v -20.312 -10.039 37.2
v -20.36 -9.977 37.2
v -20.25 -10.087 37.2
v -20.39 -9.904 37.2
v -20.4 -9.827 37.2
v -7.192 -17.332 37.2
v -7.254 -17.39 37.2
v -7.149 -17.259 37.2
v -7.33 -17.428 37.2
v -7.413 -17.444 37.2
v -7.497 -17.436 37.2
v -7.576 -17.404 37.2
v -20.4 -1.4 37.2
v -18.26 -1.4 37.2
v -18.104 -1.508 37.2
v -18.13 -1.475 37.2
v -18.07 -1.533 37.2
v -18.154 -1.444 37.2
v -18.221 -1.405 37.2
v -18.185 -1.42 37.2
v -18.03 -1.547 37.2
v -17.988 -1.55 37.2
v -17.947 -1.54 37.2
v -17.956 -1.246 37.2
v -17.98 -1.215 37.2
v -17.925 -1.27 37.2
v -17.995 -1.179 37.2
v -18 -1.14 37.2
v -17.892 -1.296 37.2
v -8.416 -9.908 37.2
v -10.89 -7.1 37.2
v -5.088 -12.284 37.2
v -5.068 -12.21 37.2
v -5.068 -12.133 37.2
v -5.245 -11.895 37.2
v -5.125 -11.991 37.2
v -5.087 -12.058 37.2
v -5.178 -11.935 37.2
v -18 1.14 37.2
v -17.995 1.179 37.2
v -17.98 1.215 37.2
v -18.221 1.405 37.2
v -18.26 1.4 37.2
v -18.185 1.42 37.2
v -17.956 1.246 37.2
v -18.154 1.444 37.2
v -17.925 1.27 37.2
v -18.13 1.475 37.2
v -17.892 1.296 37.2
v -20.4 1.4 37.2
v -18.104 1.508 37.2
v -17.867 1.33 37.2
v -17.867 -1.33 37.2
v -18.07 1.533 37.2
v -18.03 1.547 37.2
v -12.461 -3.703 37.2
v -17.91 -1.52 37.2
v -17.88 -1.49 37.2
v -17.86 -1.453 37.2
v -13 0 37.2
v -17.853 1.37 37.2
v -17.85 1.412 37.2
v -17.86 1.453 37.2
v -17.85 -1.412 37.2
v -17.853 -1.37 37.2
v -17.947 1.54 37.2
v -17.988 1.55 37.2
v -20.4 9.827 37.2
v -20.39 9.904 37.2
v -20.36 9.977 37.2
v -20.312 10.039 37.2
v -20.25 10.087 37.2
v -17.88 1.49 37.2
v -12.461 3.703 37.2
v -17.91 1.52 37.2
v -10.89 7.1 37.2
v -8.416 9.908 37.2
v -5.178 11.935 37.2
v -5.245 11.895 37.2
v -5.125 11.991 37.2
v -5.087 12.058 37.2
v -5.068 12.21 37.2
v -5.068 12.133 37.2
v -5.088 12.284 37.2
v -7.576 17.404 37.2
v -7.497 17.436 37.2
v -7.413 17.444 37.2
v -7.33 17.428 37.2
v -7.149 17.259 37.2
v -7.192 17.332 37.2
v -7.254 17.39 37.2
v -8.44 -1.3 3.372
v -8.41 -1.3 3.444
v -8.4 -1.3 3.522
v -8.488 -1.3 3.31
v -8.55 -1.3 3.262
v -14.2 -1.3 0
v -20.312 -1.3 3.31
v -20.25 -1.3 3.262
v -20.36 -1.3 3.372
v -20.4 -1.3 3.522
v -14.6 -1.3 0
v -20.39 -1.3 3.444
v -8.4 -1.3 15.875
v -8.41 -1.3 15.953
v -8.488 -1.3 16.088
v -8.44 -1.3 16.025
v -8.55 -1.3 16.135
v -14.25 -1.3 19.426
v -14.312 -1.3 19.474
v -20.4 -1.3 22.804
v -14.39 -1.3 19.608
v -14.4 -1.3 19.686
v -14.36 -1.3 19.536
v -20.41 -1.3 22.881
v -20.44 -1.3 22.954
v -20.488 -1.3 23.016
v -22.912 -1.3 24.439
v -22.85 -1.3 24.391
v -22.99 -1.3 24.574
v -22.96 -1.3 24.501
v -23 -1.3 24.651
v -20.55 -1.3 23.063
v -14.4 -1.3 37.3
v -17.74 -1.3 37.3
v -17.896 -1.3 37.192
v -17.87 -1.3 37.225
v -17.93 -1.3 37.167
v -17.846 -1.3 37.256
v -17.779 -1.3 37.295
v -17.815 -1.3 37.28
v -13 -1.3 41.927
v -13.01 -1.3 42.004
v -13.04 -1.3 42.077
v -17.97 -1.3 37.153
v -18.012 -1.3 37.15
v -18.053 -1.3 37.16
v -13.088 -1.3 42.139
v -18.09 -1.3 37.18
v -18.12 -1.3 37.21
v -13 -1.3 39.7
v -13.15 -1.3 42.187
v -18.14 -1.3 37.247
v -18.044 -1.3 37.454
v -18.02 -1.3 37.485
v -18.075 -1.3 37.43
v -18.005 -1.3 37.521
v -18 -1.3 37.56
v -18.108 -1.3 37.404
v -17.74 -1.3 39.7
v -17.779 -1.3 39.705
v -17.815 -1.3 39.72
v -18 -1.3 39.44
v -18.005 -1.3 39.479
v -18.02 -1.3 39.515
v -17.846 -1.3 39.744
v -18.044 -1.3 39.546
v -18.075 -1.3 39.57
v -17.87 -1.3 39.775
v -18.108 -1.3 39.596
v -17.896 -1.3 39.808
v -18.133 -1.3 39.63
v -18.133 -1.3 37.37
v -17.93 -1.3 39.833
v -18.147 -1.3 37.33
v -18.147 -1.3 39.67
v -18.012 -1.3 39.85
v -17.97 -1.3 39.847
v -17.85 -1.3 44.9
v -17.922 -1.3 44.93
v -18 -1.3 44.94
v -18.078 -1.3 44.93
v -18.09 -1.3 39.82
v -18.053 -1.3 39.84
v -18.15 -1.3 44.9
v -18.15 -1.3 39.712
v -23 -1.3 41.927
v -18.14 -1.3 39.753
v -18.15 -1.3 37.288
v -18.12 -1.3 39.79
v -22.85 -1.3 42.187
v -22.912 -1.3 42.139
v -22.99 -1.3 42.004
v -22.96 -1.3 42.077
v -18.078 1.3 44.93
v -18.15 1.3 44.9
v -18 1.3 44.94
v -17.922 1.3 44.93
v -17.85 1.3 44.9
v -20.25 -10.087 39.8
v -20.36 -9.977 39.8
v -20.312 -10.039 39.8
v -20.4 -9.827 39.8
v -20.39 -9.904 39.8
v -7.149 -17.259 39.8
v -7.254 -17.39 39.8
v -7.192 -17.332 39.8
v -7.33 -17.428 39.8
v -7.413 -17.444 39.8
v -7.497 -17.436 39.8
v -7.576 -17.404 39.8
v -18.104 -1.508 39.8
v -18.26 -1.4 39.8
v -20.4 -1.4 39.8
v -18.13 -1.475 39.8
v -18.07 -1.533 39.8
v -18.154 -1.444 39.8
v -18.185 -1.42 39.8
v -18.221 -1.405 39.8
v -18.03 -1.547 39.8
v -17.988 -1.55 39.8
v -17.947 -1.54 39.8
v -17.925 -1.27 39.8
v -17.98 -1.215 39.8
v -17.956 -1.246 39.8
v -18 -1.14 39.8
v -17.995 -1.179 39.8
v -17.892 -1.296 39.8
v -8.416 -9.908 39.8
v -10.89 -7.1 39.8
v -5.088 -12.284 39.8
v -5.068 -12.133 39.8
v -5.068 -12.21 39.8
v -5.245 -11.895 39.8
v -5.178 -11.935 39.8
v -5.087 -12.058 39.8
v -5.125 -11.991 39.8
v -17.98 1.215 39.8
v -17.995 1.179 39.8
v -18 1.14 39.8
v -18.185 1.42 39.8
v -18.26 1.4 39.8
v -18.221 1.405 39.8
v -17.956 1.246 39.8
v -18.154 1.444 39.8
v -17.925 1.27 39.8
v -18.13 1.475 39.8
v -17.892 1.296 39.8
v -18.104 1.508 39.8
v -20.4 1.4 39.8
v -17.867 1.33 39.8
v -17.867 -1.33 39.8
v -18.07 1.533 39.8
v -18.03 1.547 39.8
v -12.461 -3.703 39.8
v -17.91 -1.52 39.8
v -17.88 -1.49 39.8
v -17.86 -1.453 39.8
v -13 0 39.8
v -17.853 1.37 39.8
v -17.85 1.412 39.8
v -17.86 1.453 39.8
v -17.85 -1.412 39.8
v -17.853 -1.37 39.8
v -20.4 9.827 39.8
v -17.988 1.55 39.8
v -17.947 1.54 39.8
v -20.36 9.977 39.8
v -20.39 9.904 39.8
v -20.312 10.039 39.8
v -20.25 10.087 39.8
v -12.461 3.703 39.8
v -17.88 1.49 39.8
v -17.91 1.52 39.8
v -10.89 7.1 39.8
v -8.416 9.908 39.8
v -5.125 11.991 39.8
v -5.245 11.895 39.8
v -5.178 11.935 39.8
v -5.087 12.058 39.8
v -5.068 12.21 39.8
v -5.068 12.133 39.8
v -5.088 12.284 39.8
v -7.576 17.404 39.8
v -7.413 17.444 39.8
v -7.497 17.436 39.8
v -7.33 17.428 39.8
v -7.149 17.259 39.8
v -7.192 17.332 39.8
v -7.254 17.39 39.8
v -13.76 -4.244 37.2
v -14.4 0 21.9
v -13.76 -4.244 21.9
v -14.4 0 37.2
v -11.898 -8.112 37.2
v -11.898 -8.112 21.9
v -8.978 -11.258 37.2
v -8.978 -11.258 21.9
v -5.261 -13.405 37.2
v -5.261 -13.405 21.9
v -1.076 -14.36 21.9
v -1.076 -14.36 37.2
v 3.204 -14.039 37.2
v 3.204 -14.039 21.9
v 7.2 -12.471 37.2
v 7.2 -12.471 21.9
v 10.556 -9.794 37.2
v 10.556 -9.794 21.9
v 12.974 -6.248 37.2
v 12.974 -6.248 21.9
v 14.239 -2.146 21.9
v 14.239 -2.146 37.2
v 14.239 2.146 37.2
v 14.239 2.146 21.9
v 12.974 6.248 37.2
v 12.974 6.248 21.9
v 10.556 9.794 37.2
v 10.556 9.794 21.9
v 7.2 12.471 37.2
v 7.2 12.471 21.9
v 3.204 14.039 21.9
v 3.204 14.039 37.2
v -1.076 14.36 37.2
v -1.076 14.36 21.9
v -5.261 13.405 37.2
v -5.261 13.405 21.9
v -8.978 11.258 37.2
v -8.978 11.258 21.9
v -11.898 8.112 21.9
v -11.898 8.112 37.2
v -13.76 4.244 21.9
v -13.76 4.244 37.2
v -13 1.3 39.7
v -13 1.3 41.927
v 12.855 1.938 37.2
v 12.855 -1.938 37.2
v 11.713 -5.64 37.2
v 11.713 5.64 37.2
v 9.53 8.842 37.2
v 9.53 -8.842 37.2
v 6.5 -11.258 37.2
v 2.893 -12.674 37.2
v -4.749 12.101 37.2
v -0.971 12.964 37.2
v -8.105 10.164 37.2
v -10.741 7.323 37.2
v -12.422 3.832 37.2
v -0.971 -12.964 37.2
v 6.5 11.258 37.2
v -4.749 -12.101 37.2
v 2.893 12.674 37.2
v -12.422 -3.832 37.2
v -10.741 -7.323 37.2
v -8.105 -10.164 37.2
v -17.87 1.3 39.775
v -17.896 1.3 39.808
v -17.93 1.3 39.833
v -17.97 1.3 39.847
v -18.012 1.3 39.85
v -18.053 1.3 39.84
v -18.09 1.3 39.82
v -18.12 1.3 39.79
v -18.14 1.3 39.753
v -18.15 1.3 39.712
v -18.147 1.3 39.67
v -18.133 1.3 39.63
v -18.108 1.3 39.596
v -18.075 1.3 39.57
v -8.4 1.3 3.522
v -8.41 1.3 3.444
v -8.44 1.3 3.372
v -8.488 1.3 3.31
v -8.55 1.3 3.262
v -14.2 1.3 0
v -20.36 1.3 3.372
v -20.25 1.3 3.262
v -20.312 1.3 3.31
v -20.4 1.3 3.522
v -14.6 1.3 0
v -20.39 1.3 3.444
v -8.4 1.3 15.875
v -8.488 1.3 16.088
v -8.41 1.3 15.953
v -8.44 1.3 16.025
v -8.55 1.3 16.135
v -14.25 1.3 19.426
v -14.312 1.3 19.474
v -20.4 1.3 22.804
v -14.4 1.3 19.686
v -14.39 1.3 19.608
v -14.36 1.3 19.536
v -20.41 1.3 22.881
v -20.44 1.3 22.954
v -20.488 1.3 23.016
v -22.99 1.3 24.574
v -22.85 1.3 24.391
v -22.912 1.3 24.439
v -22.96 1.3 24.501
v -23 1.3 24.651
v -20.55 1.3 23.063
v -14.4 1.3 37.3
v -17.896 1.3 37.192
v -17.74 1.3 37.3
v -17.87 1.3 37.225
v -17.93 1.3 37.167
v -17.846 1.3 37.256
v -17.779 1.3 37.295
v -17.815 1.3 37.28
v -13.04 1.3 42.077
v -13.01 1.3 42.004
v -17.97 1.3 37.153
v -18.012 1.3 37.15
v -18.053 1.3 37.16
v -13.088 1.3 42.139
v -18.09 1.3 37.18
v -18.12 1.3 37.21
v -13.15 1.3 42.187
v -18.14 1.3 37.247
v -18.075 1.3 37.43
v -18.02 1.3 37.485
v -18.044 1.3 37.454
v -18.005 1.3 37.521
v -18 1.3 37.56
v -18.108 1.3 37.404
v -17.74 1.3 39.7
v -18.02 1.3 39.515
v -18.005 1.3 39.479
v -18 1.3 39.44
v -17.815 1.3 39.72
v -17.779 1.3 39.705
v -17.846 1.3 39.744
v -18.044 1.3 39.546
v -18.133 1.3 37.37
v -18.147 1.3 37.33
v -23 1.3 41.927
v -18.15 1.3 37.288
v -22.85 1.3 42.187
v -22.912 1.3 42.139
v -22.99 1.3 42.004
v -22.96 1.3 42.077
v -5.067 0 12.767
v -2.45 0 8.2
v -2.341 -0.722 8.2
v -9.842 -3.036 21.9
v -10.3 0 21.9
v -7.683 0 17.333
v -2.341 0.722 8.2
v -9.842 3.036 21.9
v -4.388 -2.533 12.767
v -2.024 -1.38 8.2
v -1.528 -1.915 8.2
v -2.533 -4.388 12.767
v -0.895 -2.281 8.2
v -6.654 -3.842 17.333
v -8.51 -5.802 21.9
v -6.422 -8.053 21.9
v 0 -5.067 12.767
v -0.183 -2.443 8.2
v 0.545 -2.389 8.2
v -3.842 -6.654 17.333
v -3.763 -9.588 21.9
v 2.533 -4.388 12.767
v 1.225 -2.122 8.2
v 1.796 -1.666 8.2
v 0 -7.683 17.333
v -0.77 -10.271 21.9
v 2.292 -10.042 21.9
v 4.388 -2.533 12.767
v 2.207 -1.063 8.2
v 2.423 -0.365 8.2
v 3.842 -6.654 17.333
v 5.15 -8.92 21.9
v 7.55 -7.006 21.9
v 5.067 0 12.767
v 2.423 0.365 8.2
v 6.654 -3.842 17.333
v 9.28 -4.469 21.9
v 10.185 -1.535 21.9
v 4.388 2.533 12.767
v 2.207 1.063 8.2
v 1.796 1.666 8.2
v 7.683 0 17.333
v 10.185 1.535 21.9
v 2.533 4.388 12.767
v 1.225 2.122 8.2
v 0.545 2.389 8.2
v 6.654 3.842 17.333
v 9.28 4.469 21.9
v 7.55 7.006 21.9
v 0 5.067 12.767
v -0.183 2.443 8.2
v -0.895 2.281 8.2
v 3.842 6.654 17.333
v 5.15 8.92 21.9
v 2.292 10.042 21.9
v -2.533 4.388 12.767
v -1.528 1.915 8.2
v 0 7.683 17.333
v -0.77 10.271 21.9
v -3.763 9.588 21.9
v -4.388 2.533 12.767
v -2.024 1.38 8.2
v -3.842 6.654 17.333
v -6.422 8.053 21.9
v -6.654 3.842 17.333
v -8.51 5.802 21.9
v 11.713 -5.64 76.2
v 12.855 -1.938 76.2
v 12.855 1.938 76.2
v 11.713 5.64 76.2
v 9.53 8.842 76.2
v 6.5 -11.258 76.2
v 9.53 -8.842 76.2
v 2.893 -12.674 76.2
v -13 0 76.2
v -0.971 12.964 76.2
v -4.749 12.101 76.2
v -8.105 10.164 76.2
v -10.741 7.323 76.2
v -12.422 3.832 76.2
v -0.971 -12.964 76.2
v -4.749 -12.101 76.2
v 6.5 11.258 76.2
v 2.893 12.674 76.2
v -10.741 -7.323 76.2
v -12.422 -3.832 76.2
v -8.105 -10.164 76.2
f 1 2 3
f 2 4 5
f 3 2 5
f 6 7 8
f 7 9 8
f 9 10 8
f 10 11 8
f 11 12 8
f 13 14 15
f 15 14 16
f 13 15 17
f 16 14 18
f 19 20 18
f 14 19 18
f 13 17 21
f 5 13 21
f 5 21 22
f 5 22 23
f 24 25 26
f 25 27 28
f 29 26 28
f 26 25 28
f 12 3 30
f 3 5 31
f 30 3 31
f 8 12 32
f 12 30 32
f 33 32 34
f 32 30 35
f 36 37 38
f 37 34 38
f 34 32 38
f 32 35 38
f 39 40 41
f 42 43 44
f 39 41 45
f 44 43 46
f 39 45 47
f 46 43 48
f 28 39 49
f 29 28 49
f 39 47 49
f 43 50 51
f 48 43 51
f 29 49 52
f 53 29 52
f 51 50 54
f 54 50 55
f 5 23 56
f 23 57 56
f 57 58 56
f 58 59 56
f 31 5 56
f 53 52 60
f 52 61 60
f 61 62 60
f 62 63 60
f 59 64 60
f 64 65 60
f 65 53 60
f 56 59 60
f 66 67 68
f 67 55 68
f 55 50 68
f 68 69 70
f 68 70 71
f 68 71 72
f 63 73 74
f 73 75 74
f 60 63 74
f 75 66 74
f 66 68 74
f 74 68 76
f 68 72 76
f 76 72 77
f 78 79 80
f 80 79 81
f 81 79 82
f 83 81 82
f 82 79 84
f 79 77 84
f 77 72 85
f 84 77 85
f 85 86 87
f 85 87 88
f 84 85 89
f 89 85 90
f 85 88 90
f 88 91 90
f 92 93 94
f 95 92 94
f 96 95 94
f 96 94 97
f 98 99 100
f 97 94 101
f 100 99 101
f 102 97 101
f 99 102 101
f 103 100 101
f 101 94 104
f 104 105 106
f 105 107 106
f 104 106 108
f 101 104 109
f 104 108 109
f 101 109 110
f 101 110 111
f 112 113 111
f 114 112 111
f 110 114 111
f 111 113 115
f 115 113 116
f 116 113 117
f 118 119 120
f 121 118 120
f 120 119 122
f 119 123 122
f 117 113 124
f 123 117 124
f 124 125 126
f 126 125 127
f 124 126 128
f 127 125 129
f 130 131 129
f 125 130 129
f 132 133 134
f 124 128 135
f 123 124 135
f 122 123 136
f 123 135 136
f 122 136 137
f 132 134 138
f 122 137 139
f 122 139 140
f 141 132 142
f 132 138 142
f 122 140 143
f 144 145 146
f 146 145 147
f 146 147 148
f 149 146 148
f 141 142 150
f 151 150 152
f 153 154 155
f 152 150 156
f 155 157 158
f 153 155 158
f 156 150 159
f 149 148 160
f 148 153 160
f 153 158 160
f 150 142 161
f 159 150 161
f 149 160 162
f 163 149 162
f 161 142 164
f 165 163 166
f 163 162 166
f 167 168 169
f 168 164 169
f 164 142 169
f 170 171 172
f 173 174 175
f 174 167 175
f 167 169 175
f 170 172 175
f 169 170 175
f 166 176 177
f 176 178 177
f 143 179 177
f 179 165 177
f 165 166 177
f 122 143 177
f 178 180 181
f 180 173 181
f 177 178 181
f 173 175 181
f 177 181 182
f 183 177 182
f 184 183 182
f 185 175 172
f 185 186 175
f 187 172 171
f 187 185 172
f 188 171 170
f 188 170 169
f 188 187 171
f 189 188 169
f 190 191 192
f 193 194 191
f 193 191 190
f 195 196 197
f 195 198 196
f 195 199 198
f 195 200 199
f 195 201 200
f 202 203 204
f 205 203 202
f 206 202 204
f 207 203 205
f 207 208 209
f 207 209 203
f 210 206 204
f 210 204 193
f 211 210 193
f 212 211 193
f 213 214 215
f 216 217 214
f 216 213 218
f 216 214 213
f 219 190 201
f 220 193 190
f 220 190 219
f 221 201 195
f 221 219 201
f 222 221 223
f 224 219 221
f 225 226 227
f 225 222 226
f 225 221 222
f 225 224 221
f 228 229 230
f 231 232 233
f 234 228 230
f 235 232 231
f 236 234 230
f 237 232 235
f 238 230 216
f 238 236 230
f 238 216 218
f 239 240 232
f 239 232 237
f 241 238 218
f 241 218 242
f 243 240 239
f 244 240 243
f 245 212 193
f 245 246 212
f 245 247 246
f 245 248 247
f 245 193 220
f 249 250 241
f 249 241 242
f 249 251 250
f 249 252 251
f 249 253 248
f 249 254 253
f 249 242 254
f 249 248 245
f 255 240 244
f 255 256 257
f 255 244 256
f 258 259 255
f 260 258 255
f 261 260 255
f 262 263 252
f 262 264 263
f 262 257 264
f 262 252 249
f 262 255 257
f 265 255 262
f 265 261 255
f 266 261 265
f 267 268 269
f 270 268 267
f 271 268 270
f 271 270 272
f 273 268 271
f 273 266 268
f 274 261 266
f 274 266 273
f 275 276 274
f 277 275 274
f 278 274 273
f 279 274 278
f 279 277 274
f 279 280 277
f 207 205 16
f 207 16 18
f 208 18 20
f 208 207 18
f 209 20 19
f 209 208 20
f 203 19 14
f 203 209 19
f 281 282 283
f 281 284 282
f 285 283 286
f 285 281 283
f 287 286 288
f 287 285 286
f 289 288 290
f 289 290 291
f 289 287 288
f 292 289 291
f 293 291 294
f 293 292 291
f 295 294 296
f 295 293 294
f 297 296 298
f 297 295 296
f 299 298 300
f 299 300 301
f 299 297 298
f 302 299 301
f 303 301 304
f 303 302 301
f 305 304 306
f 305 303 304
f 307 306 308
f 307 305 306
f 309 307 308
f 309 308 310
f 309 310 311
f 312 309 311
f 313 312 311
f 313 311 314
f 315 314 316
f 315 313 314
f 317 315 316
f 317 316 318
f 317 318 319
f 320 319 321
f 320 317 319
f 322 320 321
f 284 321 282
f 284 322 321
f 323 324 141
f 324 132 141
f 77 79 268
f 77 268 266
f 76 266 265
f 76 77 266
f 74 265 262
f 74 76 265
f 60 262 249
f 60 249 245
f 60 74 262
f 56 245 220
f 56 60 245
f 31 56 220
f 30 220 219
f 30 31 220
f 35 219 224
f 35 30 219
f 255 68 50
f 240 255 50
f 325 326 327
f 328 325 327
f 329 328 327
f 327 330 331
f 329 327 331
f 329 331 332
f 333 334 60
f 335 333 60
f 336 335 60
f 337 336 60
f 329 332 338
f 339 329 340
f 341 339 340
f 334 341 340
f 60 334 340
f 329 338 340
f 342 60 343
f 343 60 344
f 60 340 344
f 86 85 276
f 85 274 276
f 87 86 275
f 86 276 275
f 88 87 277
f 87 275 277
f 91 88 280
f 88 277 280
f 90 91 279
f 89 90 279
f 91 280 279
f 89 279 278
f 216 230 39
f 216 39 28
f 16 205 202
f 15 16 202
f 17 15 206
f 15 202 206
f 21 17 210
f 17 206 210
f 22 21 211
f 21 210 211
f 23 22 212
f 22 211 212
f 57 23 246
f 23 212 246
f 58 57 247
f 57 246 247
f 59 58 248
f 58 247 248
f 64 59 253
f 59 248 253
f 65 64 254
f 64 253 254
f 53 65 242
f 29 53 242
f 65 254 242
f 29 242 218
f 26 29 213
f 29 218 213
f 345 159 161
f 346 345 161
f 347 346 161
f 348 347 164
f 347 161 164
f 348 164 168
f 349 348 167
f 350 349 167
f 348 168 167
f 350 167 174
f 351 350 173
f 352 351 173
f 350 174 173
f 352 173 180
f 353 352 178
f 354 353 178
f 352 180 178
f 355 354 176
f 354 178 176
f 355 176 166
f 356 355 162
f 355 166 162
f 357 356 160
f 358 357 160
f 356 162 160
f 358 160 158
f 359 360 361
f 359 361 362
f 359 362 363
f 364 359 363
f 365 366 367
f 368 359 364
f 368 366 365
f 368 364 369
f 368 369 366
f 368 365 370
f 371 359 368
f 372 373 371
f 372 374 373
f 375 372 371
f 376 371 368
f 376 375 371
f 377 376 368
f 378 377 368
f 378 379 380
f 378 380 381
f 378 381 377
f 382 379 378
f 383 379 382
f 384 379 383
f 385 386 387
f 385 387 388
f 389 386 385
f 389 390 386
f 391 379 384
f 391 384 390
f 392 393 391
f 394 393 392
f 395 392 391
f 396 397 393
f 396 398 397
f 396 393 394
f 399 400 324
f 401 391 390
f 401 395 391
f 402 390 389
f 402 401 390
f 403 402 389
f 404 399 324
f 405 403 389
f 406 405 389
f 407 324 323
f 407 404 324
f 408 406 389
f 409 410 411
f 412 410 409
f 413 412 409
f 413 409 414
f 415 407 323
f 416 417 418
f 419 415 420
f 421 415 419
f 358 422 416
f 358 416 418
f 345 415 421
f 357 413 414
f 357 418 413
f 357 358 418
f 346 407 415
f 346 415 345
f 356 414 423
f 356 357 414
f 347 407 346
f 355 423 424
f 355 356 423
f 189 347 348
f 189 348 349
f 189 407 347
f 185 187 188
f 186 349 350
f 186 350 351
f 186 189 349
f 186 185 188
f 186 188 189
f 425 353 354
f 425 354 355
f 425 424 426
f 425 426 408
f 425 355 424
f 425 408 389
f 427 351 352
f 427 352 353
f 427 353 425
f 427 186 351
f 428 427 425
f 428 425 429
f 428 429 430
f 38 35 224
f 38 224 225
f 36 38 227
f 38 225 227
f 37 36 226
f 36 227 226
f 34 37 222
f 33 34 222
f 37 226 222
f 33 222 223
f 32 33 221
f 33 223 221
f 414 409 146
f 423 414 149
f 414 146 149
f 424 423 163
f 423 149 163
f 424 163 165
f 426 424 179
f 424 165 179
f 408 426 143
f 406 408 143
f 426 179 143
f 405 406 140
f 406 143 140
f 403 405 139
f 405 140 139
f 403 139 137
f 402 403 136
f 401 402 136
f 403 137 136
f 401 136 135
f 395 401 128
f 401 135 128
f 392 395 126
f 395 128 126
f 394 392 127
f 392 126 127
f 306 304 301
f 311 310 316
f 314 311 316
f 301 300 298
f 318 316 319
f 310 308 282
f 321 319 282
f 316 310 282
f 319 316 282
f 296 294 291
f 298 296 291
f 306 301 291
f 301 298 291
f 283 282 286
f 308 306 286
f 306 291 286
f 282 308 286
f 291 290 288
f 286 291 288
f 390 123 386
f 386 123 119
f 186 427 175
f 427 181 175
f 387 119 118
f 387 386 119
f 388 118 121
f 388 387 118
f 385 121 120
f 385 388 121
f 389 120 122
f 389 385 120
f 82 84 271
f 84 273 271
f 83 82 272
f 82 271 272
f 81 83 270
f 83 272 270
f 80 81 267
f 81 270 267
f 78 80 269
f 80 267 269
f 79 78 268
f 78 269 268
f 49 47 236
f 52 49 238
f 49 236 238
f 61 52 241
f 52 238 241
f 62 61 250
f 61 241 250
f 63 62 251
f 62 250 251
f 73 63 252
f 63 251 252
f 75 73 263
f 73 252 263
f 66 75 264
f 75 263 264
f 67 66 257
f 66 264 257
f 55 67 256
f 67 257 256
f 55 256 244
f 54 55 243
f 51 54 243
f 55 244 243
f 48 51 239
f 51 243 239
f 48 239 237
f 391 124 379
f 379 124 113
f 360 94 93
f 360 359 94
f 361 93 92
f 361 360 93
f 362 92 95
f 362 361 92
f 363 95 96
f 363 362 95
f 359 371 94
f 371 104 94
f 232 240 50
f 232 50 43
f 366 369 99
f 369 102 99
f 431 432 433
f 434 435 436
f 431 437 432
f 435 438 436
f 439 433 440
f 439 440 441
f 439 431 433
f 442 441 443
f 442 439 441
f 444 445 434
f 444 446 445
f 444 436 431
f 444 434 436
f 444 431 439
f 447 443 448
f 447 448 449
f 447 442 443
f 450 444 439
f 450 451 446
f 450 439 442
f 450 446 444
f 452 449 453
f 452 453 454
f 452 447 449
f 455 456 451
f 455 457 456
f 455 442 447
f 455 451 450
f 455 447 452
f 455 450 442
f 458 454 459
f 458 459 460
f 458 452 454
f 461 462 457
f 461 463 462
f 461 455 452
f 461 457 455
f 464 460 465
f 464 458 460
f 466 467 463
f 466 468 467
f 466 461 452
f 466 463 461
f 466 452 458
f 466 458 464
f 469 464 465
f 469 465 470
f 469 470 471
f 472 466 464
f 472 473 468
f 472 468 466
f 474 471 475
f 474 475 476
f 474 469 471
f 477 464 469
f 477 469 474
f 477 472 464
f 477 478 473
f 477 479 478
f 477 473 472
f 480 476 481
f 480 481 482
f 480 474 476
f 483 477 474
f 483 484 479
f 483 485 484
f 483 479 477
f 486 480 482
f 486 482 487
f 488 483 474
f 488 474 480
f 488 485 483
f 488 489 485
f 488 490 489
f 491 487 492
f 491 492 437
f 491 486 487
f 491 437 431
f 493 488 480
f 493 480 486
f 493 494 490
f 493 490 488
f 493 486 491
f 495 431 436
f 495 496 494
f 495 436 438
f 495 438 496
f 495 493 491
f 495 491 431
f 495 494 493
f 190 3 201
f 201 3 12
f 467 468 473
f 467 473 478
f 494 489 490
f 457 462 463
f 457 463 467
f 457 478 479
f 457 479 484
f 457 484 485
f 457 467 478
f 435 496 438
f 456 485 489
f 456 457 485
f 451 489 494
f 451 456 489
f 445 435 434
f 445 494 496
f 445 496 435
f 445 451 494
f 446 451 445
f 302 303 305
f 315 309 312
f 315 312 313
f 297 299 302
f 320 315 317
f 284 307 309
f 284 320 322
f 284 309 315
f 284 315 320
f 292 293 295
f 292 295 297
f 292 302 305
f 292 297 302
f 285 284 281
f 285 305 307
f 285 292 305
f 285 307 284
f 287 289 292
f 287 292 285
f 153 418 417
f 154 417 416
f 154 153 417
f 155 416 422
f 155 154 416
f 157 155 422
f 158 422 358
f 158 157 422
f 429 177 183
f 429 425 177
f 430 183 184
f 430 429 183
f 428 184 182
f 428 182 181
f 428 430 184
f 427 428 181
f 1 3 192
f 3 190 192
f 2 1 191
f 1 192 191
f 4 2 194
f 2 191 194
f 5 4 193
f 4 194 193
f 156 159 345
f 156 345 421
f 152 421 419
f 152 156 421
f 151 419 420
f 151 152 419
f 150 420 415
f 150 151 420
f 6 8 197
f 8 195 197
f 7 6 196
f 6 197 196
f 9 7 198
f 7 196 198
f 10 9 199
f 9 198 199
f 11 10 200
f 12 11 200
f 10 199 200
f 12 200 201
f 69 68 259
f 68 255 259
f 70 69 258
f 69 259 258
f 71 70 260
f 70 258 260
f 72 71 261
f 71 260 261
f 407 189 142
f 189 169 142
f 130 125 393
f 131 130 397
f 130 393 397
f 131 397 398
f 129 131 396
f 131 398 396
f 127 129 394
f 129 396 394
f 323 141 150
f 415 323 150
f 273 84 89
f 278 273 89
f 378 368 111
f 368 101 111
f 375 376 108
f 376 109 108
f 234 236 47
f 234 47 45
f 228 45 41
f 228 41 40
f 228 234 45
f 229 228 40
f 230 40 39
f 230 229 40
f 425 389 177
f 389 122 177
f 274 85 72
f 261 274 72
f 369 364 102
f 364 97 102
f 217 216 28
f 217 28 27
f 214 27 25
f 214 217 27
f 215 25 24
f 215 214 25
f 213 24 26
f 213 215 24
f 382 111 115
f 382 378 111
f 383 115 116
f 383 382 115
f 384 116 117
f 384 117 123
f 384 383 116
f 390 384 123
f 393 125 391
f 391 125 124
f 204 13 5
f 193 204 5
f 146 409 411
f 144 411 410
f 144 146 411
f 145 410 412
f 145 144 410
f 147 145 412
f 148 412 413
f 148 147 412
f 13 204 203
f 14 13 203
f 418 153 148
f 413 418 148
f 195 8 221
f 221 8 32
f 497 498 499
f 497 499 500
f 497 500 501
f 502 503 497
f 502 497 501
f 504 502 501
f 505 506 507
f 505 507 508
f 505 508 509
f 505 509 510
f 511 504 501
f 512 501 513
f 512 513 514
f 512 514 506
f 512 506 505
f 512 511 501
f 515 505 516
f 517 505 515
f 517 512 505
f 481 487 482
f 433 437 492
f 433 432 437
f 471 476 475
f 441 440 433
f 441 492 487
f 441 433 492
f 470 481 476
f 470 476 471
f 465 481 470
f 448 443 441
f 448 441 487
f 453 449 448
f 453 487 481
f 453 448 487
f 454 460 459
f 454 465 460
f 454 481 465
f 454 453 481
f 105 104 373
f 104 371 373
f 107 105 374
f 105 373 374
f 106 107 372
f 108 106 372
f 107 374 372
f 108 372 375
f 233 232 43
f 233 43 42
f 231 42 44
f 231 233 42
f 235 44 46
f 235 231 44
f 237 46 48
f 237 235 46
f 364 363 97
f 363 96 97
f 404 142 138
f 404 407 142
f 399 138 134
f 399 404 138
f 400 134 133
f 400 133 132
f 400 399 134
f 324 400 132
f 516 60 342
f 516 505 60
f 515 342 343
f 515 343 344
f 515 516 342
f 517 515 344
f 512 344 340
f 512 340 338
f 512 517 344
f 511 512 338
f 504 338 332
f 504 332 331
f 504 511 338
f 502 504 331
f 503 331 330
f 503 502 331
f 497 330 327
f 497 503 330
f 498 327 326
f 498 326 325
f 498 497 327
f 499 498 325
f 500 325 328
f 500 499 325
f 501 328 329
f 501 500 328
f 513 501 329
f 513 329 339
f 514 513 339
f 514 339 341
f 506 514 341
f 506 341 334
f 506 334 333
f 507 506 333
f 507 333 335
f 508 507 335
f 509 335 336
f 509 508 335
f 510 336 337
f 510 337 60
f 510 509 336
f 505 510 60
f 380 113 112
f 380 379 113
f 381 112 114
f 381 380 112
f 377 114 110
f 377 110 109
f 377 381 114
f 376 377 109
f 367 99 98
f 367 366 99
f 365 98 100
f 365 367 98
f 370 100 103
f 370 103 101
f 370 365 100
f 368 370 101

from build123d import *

# Parameters (mm, degrees)
SKETCH003_W       = 14.4
SKETCH003_H       = 15.3
SKETCH004_W       = 13
SKETCH004_H       = 39
PAD002_DEPTH      = 1.3
POCKET_DEPTH      = 1.301
POCKET_DEPTH_BACK = 1.301
FILLET001_R       = 0.3
PAD003_DEPTH      = 2.6
POCKET001_DEPTH   = 2.601
FILLET_R          = 0.3


with BuildPart() as laser_cone:
    # Sketch002 → Revolution (revolve)
    with BuildSketch(Plane.XZ):
        Polygon((0, 21.9), (0, 8.2), (-2.45, 8.2), (-10.3, 21.9), align=None)
    revolve(axis=Axis((0, 0, 0), (0, 0, 1)))


with BuildPart() as laser_collar:
    # Sketch003 → Revolution001 (revolve)
    with BuildSketch(Plane.XZ):
        with Locations((-7.2, 29.55)):
            Rectangle(SKETCH003_W, SKETCH003_H)
    revolve(axis=Axis((0, 0, 0), (0, 0, 1)))


with BuildPart() as laser_mount_tube:
    # Sketch004 → Revolution002 (revolve)
    with BuildSketch(Plane.XZ):
        with Locations((-6.5, 56.7)):
            Rectangle(SKETCH004_W, SKETCH004_H)
    revolve(axis=Axis((0, 0, 0), (0, 0, 1)))


with BuildPart() as jig_main:
    # Sketch005 → Pad002 (new body, symmetric)
    with BuildSketch(Plane.XZ):
        Polygon((-14.4, 37.3), (-14.4, 19.512733), (-8.4, 16.048632), (-8.4, 3.348632), (-14.2, 0), (-14.6, 0), (-20.4, 3.348632), (-20.4, 22.976835), (-23, 24.477945), (-23, 42.1), (-18, 44.986751), (-13, 42.1), (-13, 39.7), (-18, 39.7), (-18, 37.3), align=None)
    extrude(amount=PAD002_DEPTH, both=True)

    # Sketch → Pocket (cut, two sides)
    with BuildSketch(Plane.XZ) as pocket_sk:
        with BuildLine():
            ThreePointArc((-17.870096, 39.775), (-18.106066, 39.806066), (-18.075, 39.570096))
            ThreePointArc((-18, 39.440192), (-18.020096, 39.515192), (-18.075, 39.570096))
            Line((-18, 39.440192), (-17.740192, 39.7))
            ThreePointArc((-17.870096, 39.775), (-17.815192, 39.720096), (-17.740192, 39.7))
        make_face()
        with BuildLine():
            ThreePointArc((-18.075, 37.429904), (-18.106066, 37.193934), (-17.870096, 37.225))
            ThreePointArc((-17.740192, 37.3), (-17.815192, 37.279904), (-17.870096, 37.225))
            Line((-18, 37.559808), (-17.740192, 37.3))
            ThreePointArc((-18.075, 37.429904), (-18.020096, 37.484808), (-18, 37.559808))
        make_face()
    extrude(amount=-POCKET_DEPTH, mode=Mode.SUBTRACT)
    extrude(pocket_sk.sketch, amount=POCKET_DEPTH_BACK, mode=Mode.SUBTRACT)

    # Fillet001
    fillet001_edges = [jig_main.edges().sort_by_distance(p)[0] for p in [
        (-13, 0, 42.1),
        (-18, 0, 44.986751),
        (-23, 0, 42.1),
        (-14.4, 0, 19.512733),
        (-8.4, 0, 16.048632),
        (-8.4, 0, 3.348632),
        (-20.4, 0, 3.348632),
        (-23, 0, 24.477945),
        (-20.4, 0, 22.976835),
    ]]
    fillet(fillet001_edges, radius=FILLET001_R)


with BuildPart() as jig_support:
    # Sketch006 (on Face1 of Binder005) → Pad003 (new body)
    with BuildSketch(Plane.XY.offset(37.2)):
        with BuildLine():
            Line((-18, 1.4), (-18, -1.4))
            Line((-20.4, -1.4), (-18, -1.4))
            Line((-20.4, -1.4), (-20.4, -10))
            Line((-20.4, -10), (-7.279786, -17.574959))
            Line((-7.279786, -17.574959), (-4.974885, -12.010434))
            ThreePointArc((-4.974885, 12.010434), (-13, 0), (-4.974885, -12.010434))
            Line((-4.974885, 12.010434), (-7.279786, 17.574959))
            Line((-7.279786, 17.574959), (-20.4, 10))
            Line((-20.4, 10), (-20.4, 1.4))
            Line((-20.4, 1.4), (-18, 1.4))
        make_face()
    extrude(amount=PAD003_DEPTH)

    # Sketch007 (on Face12 of Pad003) → Pocket001 (cut, through all)
    with BuildSketch(Plane.XY.offset(39.8)):
        with BuildLine():
            ThreePointArc((-17.925, 1.270096), (-17.893934, 1.506066), (-18.129904, 1.475))
            ThreePointArc((-18.259808, 1.4), (-18.184808, 1.420096), (-18.129904, 1.475))
            Line((-18.259808, 1.4), (-18, 1.140192))
            ThreePointArc((-17.925, 1.270096), (-17.979904, 1.215192), (-18, 1.140192))
        make_face()
        with BuildLine():
            ThreePointArc((-18.129904, -1.475), (-17.893934, -1.506066), (-17.925, -1.270096))
            ThreePointArc((-18, -1.140192), (-17.979904, -1.215192), (-17.925, -1.270096))
            Line((-18, -1.140192), (-18.259808, -1.4))
            ThreePointArc((-18.129904, -1.475), (-18.184808, -1.420096), (-18.259808, -1.4))
        make_face()
    extrude(amount=-POCKET001_DEPTH, mode=Mode.SUBTRACT)

    # Fillet
    fillet_edges = [jig_support.edges().sort_by_distance(p)[0] for p in [
        (-4.974885, 12.010434, 38.5),
        (-7.279786, 17.574959, 38.5),
        (-4.974885, -12.010434, 38.5),
        (-7.279786, -17.574959, 38.5),
        (-20.4, -10, 38.5),
        (-20.4, 10, 38.5),
    ]]
    fillet(fillet_edges, radius=FILLET_R)


solid = Compound([laser_cone.part, laser_collar.part, laser_mount_tube.part, jig_main.part, jig_support.part])
